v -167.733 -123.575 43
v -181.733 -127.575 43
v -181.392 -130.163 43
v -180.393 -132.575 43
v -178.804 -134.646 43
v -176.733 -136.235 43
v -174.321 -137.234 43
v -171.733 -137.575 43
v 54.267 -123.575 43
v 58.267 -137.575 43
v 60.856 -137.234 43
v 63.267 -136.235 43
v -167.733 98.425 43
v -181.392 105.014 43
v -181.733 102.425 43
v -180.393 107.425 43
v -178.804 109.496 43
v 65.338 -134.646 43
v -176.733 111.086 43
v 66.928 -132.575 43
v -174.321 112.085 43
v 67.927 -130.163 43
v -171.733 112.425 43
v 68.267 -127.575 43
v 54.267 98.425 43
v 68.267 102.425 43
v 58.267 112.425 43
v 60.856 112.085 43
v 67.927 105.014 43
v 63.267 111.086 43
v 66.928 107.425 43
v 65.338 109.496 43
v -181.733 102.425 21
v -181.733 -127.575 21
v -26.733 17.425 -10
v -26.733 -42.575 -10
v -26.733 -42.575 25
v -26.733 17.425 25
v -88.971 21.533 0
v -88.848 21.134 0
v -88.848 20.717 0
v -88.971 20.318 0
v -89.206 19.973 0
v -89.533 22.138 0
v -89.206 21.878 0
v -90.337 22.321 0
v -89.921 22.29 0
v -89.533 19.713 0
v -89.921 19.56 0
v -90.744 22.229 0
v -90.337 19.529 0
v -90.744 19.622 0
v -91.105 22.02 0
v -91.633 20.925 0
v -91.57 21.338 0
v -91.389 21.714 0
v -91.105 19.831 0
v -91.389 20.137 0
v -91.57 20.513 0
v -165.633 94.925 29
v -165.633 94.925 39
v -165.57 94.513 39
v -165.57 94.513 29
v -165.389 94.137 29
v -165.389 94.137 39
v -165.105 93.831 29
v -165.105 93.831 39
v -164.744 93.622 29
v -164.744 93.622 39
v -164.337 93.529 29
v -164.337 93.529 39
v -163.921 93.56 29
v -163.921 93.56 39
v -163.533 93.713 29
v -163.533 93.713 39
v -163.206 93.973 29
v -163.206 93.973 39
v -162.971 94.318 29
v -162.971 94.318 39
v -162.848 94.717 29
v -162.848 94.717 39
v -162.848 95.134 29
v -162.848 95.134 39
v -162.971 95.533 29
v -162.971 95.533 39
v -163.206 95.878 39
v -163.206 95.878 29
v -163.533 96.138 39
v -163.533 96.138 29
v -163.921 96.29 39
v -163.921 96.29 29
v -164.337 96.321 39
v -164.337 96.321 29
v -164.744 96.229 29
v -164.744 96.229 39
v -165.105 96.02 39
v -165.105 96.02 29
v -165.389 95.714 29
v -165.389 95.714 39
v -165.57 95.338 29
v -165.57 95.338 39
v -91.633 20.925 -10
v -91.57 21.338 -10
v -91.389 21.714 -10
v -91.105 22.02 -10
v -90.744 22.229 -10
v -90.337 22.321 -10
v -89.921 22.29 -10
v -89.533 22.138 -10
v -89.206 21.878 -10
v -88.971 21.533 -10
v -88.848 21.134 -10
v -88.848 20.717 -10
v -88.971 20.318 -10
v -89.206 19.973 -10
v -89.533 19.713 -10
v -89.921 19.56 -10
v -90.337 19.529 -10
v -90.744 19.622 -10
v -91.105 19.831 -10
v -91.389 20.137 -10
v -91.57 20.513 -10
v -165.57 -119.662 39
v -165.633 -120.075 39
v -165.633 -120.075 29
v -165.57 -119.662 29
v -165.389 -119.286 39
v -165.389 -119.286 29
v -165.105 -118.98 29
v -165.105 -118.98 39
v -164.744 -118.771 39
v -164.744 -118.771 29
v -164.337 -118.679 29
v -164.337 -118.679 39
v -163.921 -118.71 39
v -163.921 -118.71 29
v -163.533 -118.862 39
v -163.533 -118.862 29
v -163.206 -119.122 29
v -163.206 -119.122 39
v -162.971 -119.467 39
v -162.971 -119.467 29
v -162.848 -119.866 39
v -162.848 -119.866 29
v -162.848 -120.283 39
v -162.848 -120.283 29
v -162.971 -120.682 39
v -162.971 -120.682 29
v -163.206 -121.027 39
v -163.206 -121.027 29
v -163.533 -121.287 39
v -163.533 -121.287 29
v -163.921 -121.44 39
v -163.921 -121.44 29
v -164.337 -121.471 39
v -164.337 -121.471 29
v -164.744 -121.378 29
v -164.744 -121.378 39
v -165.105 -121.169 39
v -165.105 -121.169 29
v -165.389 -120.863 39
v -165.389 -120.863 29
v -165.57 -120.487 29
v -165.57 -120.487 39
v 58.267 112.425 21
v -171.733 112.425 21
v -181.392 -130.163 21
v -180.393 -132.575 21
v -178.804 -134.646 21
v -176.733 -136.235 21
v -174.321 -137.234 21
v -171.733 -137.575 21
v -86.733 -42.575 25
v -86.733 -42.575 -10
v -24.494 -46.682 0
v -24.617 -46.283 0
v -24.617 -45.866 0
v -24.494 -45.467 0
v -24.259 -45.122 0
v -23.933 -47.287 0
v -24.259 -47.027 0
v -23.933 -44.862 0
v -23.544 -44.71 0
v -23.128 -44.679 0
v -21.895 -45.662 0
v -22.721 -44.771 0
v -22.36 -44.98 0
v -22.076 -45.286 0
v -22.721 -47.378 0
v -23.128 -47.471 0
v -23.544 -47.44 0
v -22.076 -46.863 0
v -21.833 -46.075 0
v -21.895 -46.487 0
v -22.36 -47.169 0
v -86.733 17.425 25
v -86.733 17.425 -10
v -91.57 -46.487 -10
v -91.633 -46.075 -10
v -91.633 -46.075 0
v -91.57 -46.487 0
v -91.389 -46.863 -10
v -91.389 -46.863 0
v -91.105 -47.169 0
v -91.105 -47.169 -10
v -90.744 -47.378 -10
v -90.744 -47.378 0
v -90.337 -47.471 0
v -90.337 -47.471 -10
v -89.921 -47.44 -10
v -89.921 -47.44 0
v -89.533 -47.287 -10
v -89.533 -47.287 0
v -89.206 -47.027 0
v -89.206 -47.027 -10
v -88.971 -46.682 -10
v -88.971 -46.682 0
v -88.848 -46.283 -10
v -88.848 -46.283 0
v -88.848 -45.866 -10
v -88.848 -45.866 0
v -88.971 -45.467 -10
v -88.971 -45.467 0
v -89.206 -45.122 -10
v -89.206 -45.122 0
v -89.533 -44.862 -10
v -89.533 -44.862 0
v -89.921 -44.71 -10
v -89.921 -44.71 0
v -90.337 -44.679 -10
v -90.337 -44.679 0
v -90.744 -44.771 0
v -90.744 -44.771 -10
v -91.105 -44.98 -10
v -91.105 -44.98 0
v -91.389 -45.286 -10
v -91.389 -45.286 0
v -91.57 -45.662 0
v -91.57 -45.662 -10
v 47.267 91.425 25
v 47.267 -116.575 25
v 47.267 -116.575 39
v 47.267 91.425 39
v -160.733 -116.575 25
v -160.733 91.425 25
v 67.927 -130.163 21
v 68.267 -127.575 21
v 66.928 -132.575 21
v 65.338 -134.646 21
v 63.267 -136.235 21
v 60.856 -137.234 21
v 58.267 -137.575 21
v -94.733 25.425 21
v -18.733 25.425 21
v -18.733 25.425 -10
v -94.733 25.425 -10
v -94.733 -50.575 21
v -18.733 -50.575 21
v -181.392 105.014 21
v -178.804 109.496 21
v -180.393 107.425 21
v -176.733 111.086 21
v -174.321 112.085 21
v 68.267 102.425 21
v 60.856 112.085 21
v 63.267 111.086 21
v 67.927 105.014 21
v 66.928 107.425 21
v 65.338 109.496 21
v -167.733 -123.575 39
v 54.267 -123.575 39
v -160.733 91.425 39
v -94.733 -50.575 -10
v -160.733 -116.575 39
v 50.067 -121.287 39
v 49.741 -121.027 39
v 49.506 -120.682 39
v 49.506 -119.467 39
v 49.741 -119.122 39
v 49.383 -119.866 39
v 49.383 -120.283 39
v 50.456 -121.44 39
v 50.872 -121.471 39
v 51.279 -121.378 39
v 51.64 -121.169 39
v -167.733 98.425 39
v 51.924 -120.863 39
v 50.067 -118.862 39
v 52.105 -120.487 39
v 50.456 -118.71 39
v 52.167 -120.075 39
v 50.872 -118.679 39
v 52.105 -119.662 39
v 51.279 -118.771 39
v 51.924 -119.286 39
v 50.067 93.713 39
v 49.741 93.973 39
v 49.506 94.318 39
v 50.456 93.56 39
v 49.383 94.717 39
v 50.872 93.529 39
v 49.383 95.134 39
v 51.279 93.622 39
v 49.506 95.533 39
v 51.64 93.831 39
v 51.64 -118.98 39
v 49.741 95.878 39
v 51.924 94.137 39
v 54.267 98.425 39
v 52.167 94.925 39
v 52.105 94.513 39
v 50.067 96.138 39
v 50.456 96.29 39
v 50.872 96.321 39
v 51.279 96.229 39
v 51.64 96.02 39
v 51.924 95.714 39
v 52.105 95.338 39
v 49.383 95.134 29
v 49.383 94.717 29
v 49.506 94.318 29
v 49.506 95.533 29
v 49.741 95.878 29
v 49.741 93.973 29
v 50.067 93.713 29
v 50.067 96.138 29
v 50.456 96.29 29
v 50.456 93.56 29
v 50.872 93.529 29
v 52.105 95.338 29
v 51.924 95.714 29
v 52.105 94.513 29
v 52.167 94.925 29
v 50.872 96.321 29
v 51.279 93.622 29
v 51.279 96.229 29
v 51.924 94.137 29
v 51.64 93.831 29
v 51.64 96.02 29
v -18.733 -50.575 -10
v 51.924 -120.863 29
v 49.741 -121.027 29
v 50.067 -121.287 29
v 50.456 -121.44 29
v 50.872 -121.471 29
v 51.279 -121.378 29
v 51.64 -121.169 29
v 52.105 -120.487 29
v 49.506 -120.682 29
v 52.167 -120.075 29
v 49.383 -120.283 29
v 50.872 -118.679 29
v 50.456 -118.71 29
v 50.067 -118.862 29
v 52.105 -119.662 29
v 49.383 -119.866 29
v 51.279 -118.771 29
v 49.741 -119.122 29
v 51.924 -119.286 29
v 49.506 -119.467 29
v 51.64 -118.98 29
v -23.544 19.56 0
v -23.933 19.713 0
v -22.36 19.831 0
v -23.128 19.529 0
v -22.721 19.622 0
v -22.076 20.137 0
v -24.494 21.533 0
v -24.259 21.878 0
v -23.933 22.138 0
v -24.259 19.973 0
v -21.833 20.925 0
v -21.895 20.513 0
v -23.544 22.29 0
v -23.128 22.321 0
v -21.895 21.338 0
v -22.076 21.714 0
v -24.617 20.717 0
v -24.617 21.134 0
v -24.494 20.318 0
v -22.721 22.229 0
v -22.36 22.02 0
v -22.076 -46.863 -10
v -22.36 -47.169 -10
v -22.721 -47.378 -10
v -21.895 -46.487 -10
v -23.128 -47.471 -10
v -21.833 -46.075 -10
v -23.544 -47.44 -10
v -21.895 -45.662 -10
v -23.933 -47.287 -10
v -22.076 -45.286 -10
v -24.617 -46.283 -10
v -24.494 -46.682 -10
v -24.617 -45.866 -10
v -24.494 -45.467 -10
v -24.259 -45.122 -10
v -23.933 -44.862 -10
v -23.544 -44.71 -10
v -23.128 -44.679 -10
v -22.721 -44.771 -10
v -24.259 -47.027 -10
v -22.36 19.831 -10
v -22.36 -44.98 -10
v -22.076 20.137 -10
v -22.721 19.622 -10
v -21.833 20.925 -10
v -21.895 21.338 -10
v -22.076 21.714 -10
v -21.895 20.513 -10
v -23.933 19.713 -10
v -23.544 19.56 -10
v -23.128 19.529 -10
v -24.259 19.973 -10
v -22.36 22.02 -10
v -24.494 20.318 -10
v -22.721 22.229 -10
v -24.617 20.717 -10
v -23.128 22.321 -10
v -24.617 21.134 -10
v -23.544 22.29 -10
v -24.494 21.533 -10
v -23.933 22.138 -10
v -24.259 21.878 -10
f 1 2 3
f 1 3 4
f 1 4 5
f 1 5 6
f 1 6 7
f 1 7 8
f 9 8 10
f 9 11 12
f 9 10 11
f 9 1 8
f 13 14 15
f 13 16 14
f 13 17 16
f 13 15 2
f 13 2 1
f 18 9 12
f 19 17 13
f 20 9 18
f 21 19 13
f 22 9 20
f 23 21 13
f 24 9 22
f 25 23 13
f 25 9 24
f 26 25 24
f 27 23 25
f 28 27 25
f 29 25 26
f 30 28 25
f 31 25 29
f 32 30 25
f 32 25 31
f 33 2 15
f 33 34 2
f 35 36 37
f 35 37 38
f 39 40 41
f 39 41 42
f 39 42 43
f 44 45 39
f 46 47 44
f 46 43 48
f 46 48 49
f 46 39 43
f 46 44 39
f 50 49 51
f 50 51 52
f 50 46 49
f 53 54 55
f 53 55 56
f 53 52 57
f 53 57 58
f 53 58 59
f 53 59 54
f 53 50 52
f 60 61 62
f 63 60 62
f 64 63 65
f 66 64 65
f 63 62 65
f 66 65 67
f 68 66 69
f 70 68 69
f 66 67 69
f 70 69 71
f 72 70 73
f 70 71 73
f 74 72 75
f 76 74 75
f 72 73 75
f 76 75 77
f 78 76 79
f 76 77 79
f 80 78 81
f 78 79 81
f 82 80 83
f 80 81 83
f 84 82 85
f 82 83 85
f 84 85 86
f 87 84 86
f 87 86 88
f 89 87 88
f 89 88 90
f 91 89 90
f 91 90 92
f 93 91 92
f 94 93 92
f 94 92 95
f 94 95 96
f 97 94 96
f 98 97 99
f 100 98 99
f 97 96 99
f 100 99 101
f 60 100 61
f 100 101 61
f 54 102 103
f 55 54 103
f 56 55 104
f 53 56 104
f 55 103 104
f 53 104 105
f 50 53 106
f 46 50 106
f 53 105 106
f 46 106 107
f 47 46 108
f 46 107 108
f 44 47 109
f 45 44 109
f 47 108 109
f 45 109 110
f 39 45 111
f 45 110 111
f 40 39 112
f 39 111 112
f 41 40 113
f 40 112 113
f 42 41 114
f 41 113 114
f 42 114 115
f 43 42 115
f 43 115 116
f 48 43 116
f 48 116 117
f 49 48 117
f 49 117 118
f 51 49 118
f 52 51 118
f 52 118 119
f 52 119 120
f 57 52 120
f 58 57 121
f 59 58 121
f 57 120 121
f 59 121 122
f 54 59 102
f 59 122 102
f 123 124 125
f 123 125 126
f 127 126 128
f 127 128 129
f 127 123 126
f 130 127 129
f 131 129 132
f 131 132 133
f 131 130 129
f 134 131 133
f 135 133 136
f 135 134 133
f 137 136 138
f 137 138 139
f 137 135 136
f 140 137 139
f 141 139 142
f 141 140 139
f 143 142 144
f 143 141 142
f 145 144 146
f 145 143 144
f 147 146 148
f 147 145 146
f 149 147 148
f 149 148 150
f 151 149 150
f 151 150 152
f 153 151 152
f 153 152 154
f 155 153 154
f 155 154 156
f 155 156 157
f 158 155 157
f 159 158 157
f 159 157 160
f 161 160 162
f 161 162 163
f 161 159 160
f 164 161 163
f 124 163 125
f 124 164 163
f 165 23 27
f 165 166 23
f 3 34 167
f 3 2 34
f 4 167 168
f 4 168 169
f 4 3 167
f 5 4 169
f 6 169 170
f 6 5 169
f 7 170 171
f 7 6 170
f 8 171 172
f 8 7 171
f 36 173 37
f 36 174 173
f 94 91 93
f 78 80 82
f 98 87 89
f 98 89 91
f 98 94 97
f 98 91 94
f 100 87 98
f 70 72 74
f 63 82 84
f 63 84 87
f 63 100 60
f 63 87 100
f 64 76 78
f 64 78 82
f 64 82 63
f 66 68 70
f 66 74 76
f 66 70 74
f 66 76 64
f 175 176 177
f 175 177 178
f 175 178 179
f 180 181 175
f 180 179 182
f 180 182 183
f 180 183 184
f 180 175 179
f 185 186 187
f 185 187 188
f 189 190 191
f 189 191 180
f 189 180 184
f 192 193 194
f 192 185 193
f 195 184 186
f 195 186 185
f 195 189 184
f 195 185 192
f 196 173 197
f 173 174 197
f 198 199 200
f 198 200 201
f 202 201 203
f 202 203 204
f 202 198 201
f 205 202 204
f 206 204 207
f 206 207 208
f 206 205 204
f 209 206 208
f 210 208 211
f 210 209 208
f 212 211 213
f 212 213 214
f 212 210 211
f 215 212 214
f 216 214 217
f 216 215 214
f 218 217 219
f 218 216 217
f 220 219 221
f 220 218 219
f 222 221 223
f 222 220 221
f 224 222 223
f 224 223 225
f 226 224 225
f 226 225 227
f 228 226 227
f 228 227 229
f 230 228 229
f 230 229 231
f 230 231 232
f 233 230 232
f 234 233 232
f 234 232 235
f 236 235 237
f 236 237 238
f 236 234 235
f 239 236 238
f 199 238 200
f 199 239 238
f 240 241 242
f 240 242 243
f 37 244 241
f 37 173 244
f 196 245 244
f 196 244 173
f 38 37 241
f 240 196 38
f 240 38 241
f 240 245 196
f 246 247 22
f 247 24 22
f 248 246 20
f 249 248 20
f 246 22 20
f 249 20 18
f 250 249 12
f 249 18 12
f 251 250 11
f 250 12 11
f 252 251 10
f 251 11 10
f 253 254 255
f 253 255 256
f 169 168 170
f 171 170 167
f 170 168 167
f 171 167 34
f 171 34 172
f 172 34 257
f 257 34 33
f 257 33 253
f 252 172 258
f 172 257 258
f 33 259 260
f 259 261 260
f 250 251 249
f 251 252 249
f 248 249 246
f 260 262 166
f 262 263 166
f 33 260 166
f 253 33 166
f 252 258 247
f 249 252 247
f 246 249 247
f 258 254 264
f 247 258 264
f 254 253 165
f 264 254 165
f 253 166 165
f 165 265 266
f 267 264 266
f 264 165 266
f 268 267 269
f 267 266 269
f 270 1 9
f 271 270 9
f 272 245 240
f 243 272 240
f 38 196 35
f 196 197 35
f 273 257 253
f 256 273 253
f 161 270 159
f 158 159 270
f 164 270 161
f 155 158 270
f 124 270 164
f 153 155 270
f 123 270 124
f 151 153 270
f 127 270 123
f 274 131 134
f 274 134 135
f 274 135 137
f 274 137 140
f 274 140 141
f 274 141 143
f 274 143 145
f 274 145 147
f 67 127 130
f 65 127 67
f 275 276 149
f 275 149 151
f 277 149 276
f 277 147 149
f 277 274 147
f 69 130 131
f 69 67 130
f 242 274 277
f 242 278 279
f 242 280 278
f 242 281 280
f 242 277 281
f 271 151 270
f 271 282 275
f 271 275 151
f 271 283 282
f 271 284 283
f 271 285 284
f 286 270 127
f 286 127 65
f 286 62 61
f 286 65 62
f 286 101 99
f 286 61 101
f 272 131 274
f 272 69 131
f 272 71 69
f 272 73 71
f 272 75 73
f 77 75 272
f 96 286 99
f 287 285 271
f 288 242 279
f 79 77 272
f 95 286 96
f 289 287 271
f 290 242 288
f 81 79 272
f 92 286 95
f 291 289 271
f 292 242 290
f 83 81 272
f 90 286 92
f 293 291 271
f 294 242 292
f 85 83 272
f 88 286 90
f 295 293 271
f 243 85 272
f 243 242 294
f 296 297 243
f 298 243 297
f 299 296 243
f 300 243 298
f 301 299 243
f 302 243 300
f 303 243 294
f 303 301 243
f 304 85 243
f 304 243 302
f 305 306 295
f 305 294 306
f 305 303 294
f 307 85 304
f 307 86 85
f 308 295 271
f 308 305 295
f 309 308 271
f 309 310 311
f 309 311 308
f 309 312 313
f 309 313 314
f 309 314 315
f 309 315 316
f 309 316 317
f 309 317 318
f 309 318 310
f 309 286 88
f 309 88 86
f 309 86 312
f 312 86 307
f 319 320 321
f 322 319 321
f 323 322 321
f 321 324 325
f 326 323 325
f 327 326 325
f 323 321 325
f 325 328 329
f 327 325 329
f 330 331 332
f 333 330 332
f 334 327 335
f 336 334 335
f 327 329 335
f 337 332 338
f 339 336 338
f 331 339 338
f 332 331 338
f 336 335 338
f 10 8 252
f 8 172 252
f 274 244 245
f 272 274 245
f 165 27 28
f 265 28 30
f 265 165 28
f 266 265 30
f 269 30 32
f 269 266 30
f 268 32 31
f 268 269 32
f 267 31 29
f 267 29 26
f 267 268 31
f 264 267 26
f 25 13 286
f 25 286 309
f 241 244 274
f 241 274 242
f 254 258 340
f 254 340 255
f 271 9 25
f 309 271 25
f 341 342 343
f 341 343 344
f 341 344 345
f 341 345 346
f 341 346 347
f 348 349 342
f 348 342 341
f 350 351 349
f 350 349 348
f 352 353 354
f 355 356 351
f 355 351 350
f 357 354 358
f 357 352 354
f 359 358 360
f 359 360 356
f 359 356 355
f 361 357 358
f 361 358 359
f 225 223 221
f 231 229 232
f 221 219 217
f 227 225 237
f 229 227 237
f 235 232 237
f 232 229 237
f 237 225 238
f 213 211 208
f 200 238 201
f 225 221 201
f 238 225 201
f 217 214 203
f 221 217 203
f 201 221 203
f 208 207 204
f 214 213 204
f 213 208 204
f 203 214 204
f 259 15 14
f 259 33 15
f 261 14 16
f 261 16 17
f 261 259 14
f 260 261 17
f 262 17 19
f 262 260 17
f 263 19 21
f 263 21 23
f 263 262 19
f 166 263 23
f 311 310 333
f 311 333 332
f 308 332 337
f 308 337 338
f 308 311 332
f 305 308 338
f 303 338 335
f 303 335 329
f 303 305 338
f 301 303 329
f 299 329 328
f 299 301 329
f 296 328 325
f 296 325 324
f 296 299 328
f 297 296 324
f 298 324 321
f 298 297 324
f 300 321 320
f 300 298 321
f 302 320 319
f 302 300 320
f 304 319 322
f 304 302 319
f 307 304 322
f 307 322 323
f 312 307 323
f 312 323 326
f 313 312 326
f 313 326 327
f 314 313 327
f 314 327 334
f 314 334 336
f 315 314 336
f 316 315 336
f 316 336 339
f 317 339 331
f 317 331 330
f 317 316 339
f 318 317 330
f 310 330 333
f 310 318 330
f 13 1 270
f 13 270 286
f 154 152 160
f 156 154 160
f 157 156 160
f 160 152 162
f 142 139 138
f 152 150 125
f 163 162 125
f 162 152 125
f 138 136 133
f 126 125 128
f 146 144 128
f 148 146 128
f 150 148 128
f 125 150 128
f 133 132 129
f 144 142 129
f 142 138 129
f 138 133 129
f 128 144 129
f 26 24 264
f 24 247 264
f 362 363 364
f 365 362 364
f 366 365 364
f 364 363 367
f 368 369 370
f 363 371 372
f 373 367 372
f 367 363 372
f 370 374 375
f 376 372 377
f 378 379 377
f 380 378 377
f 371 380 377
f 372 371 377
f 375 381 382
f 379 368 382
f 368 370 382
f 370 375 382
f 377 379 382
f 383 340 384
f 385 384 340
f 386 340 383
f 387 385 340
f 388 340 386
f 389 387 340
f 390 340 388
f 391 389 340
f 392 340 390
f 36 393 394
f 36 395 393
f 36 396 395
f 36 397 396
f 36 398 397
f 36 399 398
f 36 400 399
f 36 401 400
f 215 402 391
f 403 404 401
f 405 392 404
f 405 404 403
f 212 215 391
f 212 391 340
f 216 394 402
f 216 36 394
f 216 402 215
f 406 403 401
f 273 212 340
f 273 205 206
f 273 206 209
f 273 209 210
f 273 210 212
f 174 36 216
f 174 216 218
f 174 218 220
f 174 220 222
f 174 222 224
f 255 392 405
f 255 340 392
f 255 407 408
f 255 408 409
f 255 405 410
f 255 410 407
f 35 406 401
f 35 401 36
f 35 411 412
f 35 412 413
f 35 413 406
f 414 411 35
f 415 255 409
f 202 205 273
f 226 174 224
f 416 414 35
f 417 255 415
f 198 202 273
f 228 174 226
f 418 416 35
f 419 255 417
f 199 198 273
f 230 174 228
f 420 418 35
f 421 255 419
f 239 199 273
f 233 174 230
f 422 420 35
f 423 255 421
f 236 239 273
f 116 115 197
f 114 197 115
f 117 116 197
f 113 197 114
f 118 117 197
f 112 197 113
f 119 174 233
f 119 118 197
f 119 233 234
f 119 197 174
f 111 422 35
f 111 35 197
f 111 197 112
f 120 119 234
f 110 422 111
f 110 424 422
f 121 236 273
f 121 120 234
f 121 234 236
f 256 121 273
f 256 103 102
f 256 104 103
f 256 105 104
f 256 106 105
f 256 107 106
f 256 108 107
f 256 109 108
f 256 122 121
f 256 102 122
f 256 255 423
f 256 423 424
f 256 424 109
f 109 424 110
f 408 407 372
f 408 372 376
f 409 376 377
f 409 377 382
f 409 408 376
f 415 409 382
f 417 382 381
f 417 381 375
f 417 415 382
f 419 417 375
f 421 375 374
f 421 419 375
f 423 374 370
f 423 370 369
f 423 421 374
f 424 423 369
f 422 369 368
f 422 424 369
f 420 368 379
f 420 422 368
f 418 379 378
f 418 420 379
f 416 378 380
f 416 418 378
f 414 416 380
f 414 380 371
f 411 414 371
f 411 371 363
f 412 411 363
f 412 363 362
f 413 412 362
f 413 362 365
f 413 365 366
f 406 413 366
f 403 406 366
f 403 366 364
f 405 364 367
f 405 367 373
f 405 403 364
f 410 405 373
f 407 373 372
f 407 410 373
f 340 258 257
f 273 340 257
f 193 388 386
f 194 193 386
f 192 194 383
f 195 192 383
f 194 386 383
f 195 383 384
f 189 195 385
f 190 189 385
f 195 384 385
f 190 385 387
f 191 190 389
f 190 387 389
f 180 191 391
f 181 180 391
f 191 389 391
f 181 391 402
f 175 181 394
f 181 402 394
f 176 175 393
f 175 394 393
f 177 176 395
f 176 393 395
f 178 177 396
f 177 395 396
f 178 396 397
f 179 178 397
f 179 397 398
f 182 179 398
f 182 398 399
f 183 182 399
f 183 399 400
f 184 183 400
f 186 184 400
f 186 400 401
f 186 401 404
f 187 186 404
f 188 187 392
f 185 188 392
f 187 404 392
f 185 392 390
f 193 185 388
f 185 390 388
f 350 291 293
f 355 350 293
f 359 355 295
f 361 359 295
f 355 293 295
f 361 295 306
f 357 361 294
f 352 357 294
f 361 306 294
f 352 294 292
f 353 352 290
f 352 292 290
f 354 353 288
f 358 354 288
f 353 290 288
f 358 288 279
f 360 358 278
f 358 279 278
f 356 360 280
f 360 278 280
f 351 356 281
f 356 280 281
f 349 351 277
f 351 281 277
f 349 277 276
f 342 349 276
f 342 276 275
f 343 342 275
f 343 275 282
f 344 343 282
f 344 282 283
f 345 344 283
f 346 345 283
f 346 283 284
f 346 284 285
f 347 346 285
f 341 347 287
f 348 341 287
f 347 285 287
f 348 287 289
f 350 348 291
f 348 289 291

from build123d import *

# Parameters (mm, degrees)
SKETCH1_W               = 63
SKETCH1_H               = 63
BOSS_EXTRUDE1_DEPTH     = 5
SKETCH3_W               = 63
SKETCH3_H               = 63
SKETCH3_W_2             = 60
SKETCH3_H_2             = 60
BOSS_EXTRUDE2_DEPTH     = 16
SKETCH7_W               = 250
SKETCH7_H               = 250
SKETCH7_W_2             = 60
SKETCH7_H_2             = 60
BOSS_EXTRUDE5_DEPTH     = 4
SKETCH9_W               = 250
SKETCH9_H               = 250
SKETCH9_W_2             = 210
SKETCH9_H_2             = 210
BOSS_EXTRUDE6_DEPTH     = 18
SKETCH10_W              = 222
SKETCH10_H              = 222
CUT_EXTRUDE1_DEPTH      = 4
SKETCH14_W              = 210
SKETCH14_H              = 210
SKETCH14_W_2            = 208
SKETCH14_H_2            = 208
BOSS_EXTRUDE9_DEPTH     = 14
SKETCH16_R              = 1.4
CUT_EXTRUDE2_DEPTH      = 10
MIRROR2_COPY_1_SKETCH_R = 1.4
MIRROR2_COPY_1_DEPTH    = 10
FILLET1_R               = 10
FILLET2_R               = 10
FILLET3_R               = 10
FILLET4_R               = 10
SKETCH17_W              = 63
SKETCH17_H              = 63
BOSS_EXTRUDE10_DEPTH    = 10
BOSS_EXTRUDE13_START    = -53
SKETCH18_W              = 69
SKETCH18_H              = 69
SKETCH18_W_2            = 63
SKETCH18_H_2            = 63
BOSS_EXTRUDE13_DEPTH    = 53
SKETCH20_W              = 69
SKETCH20_H              = 69
CUT_EXTRUDE3_DEPTH      = 18
SKETCH21_W              = 60
SKETCH21_H              = 60
CUT_EXTRUDE4_DEPTH      = 232.079018744
SKETCH24_W              = 76
SKETCH24_H              = 76
SKETCH24_W_2            = 69
SKETCH24_H_2            = 69
BOSS_EXTRUDE14_DEPTH    = 31
SKETCH25_R              = 1.4
CUT_EXTRUDE5_DEPTH      = 10
MIRROR4_COPY_1_SKETCH_R = 1.4
MIRROR4_COPY_1_DEPTH    = 10


with BuildPart() as part:
    # Sketch1 → Boss-Extrude1 (new body)
    with BuildSketch(Plane.XY):
        with Locations((-56.732567938, -12.574658475)):
            Rectangle(SKETCH1_W, SKETCH1_H)
    extrude(amount=BOSS_EXTRUDE1_DEPTH)

    # Sketch3 → Boss-Extrude2 (add)
    with BuildSketch(Plane.XY.offset(5)):
        with Locations((-56.732567938, -12.574658475)):
            Rectangle(SKETCH3_W, SKETCH3_H)
        with Locations((-56.732567938, -12.574658475)):
            Rectangle(SKETCH3_W_2, SKETCH3_H_2, mode=Mode.SUBTRACT)
    extrude(amount=BOSS_EXTRUDE2_DEPTH)

    # Sketch7 → Boss-Extrude5 (add)
    with BuildSketch(Plane.XY.offset(21)):
        with Locations((-56.732567938, -12.574658475)):
            Rectangle(SKETCH7_W, SKETCH7_H)
        with Locations((-56.732567938, -12.574658475)):
            Rectangle(SKETCH7_W_2, SKETCH7_H_2, mode=Mode.SUBTRACT)
    extrude(amount=BOSS_EXTRUDE5_DEPTH)

    # Sketch9 → Boss-Extrude6 (add)
    with BuildSketch(Plane.XY.offset(25)):
        with Locations((-56.732567938, -12.574658475)):
            Rectangle(SKETCH9_W, SKETCH9_H)
        with Locations((-56.732567938, -12.574658475)):
            Rectangle(SKETCH9_W_2, SKETCH9_H_2, mode=Mode.SUBTRACT)
    extrude(amount=BOSS_EXTRUDE6_DEPTH)

    # Sketch10 → Cut-Extrude1 (cut)
    with BuildSketch(Plane.XY.offset(43)):
        with Locations((-56.732567938, -12.574658475)):
            Rectangle(SKETCH10_W, SKETCH10_H)
    extrude(amount=-CUT_EXTRUDE1_DEPTH, mode=Mode.SUBTRACT)

    # Sketch14 → Boss-Extrude9 (add)
    with BuildSketch(Plane.XY.offset(25)):
        with Locations((-56.732567938, -12.574658475)):
            Rectangle(SKETCH14_W, SKETCH14_H)
        with Locations((-56.732567938, -12.574658475)):
            Rectangle(SKETCH14_W_2, SKETCH14_H_2, mode=Mode.SUBTRACT)
    extrude(amount=BOSS_EXTRUDE9_DEPTH)

    # Sketch16 → Cut-Extrude2 (cut)
    with BuildSketch(Plane.XY.offset(39)):
        with Locations((50.767432062, -120.074658475)):
            Circle(SKETCH16_R)
    cut_extrude2 = extrude(amount=-CUT_EXTRUDE2_DEPTH, mode=Mode.SUBTRACT)

    # Mirror1: Cut-Extrude2 across plane
    add(cut_extrude2.mirror(Plane(origin=(-56.732567938, 0, 0), x_dir=(0, 0, 1), z_dir=(1, 0, 0))), mode=Mode.SUBTRACT)

    # Mirror2: Cut-Extrude2 across plane
    add(cut_extrude2.mirror(Plane.ZX.offset(-12.574658475)), mode=Mode.SUBTRACT)

    # Mirror2 copy 1 sketch → Mirror2 copy 1 (cut)
    with BuildSketch(Plane(origin=(-113.465135876, -25.149316949, 39), x_dir=(-1, 0, 0), z_dir=(0, 0, 1))):
        with Locations((50.767432062, -120.074658475)):
            Circle(MIRROR2_COPY_1_SKETCH_R)
    extrude(amount=-MIRROR2_COPY_1_DEPTH, mode=Mode.SUBTRACT)

    # Fillet1
    fillet1_edges = [part.edges().sort_by_distance(p)[0] for p in [
        (-181.732567938, 112.425341525, 32),
    ]]
    fillet(fillet1_edges, radius=FILLET1_R)

    # Fillet2
    fillet2_edges = [part.edges().sort_by_distance(p)[0] for p in [
        (-181.732567938, -137.574658475, 32),
    ]]
    fillet(fillet2_edges, radius=FILLET2_R)

    # Fillet3
    fillet3_edges = [part.edges().sort_by_distance(p)[0] for p in [
        (68.267432062, 112.425341525, 32),
    ]]
    fillet(fillet3_edges, radius=FILLET3_R)

    # Fillet4
    fillet4_edges = [part.edges().sort_by_distance(p)[0] for p in [
        (68.267432062, -137.574658475, 32),
    ]]
    fillet(fillet4_edges, radius=FILLET4_R)

    # Sketch17 → Boss-Extrude10 (add)
    with BuildSketch(Plane(origin=(0, 0, 0), x_dir=(-1, 0, 0), z_dir=(0, 0, -1))):
        with Locations((56.732567938, -12.574658475)):
            Rectangle(SKETCH17_W, SKETCH17_H)
    extrude(amount=BOSS_EXTRUDE10_DEPTH)

    # Sketch18 → Boss-Extrude13 (add)
    with BuildSketch(Plane(origin=(0, 0, -10), x_dir=(-1, 0, 0), z_dir=(0, 0, -1)).offset(BOSS_EXTRUDE13_START)):
        with Locations((56.732567938, -12.574658475)):
            Rectangle(SKETCH18_W, SKETCH18_H)
        with Locations((56.732567938, -12.574658475)):
            Rectangle(SKETCH18_W_2, SKETCH18_H_2, mode=Mode.SUBTRACT)
    extrude(amount=BOSS_EXTRUDE13_DEPTH)

    # Sketch20 → Cut-Extrude3 (cut)
    with BuildSketch(Plane.XY.offset(43)):
        with Locations((-56.732567938, -12.574658475)):
            Rectangle(SKETCH20_W, SKETCH20_H)
    extrude(amount=-CUT_EXTRUDE3_DEPTH, mode=Mode.SUBTRACT)

    # Sketch21 → Cut-Extrude4 (cut, through all)
    with BuildSketch(Plane.XY.offset(5)):
        with Locations((-56.732567938, -12.574658475)):
            Rectangle(SKETCH21_W, SKETCH21_H)
    extrude(amount=-CUT_EXTRUDE4_DEPTH, mode=Mode.SUBTRACT)

    # Sketch24 → Boss-Extrude14 (add)
    with BuildSketch(Plane(origin=(0, 0, 21), x_dir=(-1, 0, 0), z_dir=(0, 0, -1))):
        with Locations((56.732567938, -12.574658475)):
            Rectangle(SKETCH24_W, SKETCH24_H)
        with Locations((56.732567938, -12.574658475)):
            Rectangle(SKETCH24_W_2, SKETCH24_H_2, mode=Mode.SUBTRACT)
    extrude(amount=BOSS_EXTRUDE14_DEPTH)

    # Sketch25 → Cut-Extrude5 (cut)
    with BuildSketch(Plane(origin=(0, 0, -10), x_dir=(-1, 0, 0), z_dir=(0, 0, -1))):
        with Locations((90.232567938, 20.925341525)):
            Circle(SKETCH25_R)
    cut_extrude5 = extrude(amount=-CUT_EXTRUDE5_DEPTH, mode=Mode.SUBTRACT)

    # Mirror3: Cut-Extrude5 across plane
    add(cut_extrude5.mirror(Plane.ZX.offset(-12.574658475)), mode=Mode.SUBTRACT)

    # Mirror4: Cut-Extrude5 across plane
    add(cut_extrude5.mirror(Plane.ZY.offset(56.732567938)), mode=Mode.SUBTRACT)

    # Mirror4 copy 1 sketch → Mirror4 copy 1 (cut)
    with BuildSketch(Plane(origin=(-113.465135876, -25.149316949, -10), x_dir=(1, 0, 0), z_dir=(0, 0, -1))):
        with Locations((90.232567938, 20.925341525)):
            Circle(MIRROR4_COPY_1_SKETCH_R)
    extrude(amount=-MIRROR4_COPY_1_DEPTH, mode=Mode.SUBTRACT)


solid = part.part
